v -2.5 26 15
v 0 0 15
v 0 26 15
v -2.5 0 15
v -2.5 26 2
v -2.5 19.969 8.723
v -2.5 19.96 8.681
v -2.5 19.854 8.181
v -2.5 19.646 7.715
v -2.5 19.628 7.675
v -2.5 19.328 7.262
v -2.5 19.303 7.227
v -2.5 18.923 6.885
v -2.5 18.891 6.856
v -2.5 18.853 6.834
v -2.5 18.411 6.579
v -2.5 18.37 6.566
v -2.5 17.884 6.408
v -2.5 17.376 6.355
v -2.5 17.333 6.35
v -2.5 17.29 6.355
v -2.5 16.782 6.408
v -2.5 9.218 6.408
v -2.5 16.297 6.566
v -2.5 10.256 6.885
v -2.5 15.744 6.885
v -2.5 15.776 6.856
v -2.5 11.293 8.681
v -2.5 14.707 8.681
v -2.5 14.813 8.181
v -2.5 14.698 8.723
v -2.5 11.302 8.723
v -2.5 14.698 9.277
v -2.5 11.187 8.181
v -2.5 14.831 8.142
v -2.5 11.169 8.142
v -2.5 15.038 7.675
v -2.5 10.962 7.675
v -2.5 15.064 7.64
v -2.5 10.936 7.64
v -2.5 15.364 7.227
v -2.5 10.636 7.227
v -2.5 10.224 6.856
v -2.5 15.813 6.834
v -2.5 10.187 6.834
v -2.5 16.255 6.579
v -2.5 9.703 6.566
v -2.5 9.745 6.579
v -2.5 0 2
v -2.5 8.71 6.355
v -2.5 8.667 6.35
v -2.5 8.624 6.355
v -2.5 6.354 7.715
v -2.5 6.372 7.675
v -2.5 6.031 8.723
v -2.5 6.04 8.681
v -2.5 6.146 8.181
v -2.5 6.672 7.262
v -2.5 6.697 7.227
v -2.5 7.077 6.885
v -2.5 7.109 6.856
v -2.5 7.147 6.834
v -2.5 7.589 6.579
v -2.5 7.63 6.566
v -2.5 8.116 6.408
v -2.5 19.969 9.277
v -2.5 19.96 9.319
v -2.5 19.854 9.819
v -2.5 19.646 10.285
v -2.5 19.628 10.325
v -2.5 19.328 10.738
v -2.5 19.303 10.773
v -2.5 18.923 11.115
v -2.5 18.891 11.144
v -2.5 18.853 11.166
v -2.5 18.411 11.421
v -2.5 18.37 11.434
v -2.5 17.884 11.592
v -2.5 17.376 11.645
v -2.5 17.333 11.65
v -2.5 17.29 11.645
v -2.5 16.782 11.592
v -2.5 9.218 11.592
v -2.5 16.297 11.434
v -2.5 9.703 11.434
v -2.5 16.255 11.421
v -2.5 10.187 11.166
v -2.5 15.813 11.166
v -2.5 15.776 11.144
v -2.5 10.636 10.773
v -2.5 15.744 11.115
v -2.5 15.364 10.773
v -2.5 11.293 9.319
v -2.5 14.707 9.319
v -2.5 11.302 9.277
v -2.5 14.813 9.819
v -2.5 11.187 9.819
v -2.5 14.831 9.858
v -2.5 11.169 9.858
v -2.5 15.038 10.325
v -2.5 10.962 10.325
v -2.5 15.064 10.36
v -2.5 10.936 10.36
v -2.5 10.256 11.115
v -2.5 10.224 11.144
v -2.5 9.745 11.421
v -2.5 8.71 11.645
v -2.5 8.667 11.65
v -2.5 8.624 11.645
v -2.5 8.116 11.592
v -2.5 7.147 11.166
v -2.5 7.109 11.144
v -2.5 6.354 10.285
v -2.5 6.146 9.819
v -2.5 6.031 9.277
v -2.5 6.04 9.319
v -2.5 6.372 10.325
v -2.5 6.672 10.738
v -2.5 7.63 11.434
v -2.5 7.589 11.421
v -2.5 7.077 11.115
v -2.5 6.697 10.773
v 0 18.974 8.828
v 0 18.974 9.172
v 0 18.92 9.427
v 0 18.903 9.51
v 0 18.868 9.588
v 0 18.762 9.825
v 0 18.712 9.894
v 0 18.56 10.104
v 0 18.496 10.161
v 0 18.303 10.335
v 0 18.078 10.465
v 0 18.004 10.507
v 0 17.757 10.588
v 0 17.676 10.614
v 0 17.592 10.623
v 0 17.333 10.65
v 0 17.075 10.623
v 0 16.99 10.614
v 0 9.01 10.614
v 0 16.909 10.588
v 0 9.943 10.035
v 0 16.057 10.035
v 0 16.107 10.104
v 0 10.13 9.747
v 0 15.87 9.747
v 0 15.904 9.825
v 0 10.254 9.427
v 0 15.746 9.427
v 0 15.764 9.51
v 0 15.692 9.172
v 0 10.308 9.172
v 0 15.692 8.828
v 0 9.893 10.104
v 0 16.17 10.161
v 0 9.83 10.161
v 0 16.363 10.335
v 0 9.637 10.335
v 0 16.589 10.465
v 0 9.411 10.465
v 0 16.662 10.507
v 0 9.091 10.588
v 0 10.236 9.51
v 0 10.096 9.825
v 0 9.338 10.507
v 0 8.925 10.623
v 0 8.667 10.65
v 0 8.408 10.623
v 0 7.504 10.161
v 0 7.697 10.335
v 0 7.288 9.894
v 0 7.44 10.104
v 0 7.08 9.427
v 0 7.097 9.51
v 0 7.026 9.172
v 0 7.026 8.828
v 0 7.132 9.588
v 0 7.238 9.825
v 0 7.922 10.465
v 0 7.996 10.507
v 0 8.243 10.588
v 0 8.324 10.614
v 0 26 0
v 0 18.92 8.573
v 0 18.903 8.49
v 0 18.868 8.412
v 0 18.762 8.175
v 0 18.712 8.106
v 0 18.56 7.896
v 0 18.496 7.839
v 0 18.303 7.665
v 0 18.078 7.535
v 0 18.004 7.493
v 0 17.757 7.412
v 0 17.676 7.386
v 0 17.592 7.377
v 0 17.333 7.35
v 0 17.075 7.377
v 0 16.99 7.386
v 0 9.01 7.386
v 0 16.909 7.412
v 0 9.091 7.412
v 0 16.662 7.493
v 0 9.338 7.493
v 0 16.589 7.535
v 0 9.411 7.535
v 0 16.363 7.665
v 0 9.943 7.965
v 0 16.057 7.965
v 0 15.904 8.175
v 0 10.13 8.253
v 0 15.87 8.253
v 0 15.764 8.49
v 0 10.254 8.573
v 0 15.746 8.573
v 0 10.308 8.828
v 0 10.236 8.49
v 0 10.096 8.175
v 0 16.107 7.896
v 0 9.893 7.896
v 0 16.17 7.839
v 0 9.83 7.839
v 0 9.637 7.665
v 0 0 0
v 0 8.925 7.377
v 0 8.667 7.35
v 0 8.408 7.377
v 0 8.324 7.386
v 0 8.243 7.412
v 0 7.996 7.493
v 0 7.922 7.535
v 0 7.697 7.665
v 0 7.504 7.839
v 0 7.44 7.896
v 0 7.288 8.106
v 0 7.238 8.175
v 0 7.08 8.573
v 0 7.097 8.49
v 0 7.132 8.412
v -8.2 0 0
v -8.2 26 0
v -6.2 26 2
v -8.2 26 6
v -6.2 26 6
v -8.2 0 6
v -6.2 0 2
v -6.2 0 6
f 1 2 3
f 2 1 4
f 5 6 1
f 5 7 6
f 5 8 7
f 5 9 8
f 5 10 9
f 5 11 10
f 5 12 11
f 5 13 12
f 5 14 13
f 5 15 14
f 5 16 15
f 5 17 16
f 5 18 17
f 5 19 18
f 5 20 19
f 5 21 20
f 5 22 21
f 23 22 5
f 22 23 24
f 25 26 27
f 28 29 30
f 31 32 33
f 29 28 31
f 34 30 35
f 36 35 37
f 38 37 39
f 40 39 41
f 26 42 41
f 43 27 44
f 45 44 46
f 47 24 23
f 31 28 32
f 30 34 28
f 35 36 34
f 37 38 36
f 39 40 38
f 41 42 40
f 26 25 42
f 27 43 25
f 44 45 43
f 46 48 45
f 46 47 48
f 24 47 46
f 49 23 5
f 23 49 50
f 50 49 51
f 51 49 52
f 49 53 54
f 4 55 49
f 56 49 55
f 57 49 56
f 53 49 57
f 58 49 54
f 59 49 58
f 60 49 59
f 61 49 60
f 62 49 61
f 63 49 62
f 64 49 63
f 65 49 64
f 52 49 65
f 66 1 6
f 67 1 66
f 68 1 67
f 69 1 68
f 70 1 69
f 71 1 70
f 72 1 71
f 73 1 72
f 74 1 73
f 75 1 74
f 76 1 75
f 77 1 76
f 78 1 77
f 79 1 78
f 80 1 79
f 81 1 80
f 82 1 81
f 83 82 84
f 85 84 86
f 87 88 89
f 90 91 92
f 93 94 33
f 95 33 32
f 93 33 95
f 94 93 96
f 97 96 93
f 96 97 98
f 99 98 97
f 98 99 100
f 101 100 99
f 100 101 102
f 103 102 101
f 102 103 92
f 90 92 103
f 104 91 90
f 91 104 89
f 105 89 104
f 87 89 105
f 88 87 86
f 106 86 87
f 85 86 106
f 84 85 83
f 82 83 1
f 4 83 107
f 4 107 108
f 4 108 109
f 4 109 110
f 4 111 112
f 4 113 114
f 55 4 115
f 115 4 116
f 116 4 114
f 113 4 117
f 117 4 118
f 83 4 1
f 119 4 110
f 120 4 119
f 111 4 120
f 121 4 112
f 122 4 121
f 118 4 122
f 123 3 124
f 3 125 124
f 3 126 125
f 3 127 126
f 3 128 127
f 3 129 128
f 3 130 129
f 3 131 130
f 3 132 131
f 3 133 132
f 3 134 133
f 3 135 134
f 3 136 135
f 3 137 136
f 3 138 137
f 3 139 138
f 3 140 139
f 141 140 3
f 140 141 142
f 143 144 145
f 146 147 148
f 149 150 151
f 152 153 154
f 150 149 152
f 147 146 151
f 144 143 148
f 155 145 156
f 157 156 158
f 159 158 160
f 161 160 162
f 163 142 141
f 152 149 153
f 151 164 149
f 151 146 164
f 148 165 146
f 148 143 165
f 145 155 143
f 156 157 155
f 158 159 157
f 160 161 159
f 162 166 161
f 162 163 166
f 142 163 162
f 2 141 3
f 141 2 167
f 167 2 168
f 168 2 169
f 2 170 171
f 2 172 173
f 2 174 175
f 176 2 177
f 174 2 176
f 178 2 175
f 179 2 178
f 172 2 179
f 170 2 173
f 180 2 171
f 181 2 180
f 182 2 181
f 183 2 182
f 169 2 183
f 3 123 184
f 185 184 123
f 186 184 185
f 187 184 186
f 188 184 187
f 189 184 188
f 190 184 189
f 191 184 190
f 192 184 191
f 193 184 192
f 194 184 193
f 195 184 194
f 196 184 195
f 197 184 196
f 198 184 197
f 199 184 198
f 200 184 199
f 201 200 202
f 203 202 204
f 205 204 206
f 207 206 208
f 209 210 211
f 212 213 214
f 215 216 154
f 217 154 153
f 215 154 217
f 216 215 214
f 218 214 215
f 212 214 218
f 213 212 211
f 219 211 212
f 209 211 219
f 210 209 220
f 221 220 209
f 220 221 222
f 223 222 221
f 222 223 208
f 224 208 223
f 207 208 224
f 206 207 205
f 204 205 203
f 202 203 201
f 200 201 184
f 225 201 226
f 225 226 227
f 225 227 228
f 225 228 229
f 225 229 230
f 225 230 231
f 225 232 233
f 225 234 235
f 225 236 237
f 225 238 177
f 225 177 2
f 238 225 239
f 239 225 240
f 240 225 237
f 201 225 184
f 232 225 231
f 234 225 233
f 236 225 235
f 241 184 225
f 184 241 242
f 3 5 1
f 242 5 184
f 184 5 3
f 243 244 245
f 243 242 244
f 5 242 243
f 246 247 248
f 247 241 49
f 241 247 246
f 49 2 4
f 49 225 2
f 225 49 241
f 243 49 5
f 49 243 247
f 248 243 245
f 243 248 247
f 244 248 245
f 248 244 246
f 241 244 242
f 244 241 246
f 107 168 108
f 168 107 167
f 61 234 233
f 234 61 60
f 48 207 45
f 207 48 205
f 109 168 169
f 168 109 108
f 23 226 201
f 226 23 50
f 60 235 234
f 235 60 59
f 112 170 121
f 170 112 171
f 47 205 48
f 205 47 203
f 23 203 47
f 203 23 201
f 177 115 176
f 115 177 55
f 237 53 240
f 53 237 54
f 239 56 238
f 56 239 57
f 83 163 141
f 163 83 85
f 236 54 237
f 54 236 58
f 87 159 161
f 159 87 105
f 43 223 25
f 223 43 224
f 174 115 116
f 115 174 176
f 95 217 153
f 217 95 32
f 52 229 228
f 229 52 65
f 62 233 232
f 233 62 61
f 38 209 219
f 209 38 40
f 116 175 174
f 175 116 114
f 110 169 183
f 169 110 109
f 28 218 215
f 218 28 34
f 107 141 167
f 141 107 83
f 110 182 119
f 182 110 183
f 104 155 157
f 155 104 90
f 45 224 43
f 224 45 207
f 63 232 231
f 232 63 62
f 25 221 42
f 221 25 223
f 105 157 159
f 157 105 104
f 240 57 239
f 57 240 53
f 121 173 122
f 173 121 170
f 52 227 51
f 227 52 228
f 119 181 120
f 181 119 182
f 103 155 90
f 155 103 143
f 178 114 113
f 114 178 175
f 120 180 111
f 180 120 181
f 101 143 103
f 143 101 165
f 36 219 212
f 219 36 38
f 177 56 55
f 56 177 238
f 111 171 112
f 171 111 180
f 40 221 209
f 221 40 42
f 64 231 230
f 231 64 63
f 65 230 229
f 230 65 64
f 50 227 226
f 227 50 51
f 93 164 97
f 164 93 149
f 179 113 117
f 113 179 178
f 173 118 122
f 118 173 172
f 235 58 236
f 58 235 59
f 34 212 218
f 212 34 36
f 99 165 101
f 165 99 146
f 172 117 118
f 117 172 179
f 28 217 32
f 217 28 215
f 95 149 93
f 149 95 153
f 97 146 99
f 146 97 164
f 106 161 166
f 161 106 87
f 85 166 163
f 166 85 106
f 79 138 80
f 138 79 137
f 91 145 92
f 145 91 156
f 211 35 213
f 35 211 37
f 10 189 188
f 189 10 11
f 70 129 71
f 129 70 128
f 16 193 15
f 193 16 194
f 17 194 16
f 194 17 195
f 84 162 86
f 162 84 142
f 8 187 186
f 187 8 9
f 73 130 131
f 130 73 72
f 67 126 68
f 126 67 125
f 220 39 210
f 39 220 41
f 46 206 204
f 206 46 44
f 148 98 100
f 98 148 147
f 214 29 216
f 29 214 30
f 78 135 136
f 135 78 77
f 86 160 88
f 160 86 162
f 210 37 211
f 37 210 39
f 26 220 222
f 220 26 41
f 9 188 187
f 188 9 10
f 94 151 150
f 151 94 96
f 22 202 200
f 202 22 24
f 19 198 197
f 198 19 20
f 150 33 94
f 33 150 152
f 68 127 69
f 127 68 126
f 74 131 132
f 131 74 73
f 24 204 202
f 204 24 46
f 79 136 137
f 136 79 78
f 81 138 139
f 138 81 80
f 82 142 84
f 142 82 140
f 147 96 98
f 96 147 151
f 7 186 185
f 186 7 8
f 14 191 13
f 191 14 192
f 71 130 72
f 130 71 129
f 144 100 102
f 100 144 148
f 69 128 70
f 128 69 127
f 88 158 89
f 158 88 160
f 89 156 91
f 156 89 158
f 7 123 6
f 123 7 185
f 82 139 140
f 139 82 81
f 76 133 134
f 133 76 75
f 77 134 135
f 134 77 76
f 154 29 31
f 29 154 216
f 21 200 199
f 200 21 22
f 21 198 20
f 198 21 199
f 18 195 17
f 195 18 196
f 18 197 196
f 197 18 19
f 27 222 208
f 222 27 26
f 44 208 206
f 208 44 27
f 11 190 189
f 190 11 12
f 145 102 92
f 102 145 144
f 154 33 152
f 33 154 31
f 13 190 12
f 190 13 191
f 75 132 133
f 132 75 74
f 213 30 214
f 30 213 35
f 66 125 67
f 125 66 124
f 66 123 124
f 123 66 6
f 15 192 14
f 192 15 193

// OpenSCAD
// Bracket Width
width = 15; // [13:100]

// Bracket Length
length = 26; // [13:100]

// Gap for Door Slider
door_gap = 3.5; 

// Bracket sidewall thickness
thickness = 2; 

screw_diam_top = 5.7;
screw_diam_bot = 2.9;
screw_head_depth = 2.5;

thickness_bot = screw_head_depth;
side_h = thickness_bot + door_gap + 0.2;


module screw_hole(d1,d2,th) {
    cylinder ($fn=30,d1=d1, d2 = d2, h=th+1);
}

rotate(a = [0, -90, 0]) {
    difference () {
        union() {
            cube ([width,length,thickness_bot]);
            cube ([thickness,length,side_h]);
            translate ([0,0,side_h]) cube ([thickness+4,length,thickness]);
        }
        translate ([width*3/5,length/3,-0.5]) screw_hole(screw_diam_bot,screw_diam_top,thickness_bot);
        translate ([width*3/5,length*2/3,-0.5]) screw_hole(screw_diam_bot,screw_diam_top,thickness_bot);
        
    }
}
